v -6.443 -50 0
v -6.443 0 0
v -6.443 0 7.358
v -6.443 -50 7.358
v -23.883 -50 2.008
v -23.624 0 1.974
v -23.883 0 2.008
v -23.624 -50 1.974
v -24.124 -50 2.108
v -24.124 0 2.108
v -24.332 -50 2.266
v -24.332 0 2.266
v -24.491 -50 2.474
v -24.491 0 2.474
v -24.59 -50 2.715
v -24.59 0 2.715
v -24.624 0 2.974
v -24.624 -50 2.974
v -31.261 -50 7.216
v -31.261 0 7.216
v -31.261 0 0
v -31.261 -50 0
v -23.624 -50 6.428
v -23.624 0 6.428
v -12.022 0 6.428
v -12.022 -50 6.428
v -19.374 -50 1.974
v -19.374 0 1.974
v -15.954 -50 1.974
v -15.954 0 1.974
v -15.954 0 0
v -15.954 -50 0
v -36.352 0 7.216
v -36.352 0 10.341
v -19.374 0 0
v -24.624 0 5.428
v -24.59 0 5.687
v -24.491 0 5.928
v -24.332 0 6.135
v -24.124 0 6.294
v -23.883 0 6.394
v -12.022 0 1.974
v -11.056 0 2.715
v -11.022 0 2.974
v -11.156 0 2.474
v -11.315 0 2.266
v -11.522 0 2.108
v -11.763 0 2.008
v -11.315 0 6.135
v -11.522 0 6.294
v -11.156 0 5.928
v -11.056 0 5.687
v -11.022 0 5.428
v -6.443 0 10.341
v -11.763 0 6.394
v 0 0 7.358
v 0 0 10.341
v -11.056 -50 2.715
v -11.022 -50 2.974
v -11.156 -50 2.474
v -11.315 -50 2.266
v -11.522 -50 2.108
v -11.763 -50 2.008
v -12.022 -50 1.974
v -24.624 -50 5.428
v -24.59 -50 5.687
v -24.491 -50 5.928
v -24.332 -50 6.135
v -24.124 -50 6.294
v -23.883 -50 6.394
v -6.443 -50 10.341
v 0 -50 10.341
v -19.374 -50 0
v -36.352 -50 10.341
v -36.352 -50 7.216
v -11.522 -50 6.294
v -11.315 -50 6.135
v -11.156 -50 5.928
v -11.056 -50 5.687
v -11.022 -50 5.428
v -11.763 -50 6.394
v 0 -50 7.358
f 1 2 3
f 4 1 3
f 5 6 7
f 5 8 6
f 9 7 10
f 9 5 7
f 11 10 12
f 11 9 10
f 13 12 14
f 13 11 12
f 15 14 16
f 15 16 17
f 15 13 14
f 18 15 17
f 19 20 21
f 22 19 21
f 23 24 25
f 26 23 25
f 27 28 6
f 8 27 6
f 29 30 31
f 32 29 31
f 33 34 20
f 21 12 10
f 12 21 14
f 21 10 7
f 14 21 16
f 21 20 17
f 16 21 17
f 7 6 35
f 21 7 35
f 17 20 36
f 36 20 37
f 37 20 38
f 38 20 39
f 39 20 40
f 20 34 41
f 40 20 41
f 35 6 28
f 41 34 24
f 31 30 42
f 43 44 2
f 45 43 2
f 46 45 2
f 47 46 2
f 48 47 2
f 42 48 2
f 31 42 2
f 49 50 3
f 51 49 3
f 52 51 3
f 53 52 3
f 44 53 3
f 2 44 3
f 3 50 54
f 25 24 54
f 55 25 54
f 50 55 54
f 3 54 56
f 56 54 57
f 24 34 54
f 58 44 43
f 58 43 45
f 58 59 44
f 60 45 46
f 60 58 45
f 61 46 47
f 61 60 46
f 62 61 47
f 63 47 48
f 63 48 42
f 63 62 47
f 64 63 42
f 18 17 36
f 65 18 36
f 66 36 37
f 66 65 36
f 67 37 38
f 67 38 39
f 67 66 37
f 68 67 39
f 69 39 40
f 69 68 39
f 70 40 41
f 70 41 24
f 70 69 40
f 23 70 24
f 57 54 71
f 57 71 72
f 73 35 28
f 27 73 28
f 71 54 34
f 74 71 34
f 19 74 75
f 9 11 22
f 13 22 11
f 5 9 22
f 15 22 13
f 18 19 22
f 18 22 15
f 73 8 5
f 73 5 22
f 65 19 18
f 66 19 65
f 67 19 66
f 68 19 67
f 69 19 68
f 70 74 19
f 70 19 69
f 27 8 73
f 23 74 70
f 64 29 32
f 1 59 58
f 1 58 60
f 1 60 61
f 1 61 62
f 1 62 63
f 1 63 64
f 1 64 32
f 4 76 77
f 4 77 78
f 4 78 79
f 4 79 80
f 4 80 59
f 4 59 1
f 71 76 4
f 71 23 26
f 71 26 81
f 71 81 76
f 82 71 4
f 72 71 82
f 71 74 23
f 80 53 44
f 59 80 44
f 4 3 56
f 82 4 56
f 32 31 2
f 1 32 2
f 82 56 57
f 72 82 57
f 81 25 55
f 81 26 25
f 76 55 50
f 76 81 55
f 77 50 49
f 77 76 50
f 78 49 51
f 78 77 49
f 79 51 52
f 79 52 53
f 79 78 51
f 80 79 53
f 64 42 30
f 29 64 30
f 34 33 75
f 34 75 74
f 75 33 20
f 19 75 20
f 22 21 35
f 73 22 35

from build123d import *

# Parameters (mm, degrees)
F0_W     = 6.443182
F0_H     = 2.982489
F0_W_2   = 5.090909
F0_H_2   = 3.125394
F1_DEPTH = 50
F2_R     = 1


with BuildPart() as f1:
    # F0 (on Front) → F1 (new body)
    with BuildSketch(Plane.XZ):
        Polygon((-11.21591, 0), (-6.443182, 0), (-6.443182, 7.358421), (-6.443182, 10.34091), (-31.261364, 10.34091), (-31.261364, 7.215516), (-31.261364, 0), (-24.261364, 0), (-19.374487, 0), (-19.374487, 1.973586), (-24.624486, 1.973586), (-24.624486, 6.428131), (-11.022214, 6.428131), (-11.022214, 1.973586), (-15.954031, 1.973586), (-15.954031, 0), align=None)
        with Locations((-3.221591, 8.849666)):
            Rectangle(F0_W, F0_H)
        with Locations((-33.806818, 8.778213)):
            Rectangle(F0_W_2, F0_H_2)
    extrude(amount=F1_DEPTH)

    # F2
    f2_edges = [f1.edges().sort_by_distance(p)[0] for p in [
        (-24.624486, -25, 6.428131),
        (-11.022214, -25, 6.428131),
        (-11.022214, -25, 1.973586),
        (-24.624486, -25, 1.973586),
    ]]
    fillet(f2_edges, radius=F2_R)


solid = f1.part
